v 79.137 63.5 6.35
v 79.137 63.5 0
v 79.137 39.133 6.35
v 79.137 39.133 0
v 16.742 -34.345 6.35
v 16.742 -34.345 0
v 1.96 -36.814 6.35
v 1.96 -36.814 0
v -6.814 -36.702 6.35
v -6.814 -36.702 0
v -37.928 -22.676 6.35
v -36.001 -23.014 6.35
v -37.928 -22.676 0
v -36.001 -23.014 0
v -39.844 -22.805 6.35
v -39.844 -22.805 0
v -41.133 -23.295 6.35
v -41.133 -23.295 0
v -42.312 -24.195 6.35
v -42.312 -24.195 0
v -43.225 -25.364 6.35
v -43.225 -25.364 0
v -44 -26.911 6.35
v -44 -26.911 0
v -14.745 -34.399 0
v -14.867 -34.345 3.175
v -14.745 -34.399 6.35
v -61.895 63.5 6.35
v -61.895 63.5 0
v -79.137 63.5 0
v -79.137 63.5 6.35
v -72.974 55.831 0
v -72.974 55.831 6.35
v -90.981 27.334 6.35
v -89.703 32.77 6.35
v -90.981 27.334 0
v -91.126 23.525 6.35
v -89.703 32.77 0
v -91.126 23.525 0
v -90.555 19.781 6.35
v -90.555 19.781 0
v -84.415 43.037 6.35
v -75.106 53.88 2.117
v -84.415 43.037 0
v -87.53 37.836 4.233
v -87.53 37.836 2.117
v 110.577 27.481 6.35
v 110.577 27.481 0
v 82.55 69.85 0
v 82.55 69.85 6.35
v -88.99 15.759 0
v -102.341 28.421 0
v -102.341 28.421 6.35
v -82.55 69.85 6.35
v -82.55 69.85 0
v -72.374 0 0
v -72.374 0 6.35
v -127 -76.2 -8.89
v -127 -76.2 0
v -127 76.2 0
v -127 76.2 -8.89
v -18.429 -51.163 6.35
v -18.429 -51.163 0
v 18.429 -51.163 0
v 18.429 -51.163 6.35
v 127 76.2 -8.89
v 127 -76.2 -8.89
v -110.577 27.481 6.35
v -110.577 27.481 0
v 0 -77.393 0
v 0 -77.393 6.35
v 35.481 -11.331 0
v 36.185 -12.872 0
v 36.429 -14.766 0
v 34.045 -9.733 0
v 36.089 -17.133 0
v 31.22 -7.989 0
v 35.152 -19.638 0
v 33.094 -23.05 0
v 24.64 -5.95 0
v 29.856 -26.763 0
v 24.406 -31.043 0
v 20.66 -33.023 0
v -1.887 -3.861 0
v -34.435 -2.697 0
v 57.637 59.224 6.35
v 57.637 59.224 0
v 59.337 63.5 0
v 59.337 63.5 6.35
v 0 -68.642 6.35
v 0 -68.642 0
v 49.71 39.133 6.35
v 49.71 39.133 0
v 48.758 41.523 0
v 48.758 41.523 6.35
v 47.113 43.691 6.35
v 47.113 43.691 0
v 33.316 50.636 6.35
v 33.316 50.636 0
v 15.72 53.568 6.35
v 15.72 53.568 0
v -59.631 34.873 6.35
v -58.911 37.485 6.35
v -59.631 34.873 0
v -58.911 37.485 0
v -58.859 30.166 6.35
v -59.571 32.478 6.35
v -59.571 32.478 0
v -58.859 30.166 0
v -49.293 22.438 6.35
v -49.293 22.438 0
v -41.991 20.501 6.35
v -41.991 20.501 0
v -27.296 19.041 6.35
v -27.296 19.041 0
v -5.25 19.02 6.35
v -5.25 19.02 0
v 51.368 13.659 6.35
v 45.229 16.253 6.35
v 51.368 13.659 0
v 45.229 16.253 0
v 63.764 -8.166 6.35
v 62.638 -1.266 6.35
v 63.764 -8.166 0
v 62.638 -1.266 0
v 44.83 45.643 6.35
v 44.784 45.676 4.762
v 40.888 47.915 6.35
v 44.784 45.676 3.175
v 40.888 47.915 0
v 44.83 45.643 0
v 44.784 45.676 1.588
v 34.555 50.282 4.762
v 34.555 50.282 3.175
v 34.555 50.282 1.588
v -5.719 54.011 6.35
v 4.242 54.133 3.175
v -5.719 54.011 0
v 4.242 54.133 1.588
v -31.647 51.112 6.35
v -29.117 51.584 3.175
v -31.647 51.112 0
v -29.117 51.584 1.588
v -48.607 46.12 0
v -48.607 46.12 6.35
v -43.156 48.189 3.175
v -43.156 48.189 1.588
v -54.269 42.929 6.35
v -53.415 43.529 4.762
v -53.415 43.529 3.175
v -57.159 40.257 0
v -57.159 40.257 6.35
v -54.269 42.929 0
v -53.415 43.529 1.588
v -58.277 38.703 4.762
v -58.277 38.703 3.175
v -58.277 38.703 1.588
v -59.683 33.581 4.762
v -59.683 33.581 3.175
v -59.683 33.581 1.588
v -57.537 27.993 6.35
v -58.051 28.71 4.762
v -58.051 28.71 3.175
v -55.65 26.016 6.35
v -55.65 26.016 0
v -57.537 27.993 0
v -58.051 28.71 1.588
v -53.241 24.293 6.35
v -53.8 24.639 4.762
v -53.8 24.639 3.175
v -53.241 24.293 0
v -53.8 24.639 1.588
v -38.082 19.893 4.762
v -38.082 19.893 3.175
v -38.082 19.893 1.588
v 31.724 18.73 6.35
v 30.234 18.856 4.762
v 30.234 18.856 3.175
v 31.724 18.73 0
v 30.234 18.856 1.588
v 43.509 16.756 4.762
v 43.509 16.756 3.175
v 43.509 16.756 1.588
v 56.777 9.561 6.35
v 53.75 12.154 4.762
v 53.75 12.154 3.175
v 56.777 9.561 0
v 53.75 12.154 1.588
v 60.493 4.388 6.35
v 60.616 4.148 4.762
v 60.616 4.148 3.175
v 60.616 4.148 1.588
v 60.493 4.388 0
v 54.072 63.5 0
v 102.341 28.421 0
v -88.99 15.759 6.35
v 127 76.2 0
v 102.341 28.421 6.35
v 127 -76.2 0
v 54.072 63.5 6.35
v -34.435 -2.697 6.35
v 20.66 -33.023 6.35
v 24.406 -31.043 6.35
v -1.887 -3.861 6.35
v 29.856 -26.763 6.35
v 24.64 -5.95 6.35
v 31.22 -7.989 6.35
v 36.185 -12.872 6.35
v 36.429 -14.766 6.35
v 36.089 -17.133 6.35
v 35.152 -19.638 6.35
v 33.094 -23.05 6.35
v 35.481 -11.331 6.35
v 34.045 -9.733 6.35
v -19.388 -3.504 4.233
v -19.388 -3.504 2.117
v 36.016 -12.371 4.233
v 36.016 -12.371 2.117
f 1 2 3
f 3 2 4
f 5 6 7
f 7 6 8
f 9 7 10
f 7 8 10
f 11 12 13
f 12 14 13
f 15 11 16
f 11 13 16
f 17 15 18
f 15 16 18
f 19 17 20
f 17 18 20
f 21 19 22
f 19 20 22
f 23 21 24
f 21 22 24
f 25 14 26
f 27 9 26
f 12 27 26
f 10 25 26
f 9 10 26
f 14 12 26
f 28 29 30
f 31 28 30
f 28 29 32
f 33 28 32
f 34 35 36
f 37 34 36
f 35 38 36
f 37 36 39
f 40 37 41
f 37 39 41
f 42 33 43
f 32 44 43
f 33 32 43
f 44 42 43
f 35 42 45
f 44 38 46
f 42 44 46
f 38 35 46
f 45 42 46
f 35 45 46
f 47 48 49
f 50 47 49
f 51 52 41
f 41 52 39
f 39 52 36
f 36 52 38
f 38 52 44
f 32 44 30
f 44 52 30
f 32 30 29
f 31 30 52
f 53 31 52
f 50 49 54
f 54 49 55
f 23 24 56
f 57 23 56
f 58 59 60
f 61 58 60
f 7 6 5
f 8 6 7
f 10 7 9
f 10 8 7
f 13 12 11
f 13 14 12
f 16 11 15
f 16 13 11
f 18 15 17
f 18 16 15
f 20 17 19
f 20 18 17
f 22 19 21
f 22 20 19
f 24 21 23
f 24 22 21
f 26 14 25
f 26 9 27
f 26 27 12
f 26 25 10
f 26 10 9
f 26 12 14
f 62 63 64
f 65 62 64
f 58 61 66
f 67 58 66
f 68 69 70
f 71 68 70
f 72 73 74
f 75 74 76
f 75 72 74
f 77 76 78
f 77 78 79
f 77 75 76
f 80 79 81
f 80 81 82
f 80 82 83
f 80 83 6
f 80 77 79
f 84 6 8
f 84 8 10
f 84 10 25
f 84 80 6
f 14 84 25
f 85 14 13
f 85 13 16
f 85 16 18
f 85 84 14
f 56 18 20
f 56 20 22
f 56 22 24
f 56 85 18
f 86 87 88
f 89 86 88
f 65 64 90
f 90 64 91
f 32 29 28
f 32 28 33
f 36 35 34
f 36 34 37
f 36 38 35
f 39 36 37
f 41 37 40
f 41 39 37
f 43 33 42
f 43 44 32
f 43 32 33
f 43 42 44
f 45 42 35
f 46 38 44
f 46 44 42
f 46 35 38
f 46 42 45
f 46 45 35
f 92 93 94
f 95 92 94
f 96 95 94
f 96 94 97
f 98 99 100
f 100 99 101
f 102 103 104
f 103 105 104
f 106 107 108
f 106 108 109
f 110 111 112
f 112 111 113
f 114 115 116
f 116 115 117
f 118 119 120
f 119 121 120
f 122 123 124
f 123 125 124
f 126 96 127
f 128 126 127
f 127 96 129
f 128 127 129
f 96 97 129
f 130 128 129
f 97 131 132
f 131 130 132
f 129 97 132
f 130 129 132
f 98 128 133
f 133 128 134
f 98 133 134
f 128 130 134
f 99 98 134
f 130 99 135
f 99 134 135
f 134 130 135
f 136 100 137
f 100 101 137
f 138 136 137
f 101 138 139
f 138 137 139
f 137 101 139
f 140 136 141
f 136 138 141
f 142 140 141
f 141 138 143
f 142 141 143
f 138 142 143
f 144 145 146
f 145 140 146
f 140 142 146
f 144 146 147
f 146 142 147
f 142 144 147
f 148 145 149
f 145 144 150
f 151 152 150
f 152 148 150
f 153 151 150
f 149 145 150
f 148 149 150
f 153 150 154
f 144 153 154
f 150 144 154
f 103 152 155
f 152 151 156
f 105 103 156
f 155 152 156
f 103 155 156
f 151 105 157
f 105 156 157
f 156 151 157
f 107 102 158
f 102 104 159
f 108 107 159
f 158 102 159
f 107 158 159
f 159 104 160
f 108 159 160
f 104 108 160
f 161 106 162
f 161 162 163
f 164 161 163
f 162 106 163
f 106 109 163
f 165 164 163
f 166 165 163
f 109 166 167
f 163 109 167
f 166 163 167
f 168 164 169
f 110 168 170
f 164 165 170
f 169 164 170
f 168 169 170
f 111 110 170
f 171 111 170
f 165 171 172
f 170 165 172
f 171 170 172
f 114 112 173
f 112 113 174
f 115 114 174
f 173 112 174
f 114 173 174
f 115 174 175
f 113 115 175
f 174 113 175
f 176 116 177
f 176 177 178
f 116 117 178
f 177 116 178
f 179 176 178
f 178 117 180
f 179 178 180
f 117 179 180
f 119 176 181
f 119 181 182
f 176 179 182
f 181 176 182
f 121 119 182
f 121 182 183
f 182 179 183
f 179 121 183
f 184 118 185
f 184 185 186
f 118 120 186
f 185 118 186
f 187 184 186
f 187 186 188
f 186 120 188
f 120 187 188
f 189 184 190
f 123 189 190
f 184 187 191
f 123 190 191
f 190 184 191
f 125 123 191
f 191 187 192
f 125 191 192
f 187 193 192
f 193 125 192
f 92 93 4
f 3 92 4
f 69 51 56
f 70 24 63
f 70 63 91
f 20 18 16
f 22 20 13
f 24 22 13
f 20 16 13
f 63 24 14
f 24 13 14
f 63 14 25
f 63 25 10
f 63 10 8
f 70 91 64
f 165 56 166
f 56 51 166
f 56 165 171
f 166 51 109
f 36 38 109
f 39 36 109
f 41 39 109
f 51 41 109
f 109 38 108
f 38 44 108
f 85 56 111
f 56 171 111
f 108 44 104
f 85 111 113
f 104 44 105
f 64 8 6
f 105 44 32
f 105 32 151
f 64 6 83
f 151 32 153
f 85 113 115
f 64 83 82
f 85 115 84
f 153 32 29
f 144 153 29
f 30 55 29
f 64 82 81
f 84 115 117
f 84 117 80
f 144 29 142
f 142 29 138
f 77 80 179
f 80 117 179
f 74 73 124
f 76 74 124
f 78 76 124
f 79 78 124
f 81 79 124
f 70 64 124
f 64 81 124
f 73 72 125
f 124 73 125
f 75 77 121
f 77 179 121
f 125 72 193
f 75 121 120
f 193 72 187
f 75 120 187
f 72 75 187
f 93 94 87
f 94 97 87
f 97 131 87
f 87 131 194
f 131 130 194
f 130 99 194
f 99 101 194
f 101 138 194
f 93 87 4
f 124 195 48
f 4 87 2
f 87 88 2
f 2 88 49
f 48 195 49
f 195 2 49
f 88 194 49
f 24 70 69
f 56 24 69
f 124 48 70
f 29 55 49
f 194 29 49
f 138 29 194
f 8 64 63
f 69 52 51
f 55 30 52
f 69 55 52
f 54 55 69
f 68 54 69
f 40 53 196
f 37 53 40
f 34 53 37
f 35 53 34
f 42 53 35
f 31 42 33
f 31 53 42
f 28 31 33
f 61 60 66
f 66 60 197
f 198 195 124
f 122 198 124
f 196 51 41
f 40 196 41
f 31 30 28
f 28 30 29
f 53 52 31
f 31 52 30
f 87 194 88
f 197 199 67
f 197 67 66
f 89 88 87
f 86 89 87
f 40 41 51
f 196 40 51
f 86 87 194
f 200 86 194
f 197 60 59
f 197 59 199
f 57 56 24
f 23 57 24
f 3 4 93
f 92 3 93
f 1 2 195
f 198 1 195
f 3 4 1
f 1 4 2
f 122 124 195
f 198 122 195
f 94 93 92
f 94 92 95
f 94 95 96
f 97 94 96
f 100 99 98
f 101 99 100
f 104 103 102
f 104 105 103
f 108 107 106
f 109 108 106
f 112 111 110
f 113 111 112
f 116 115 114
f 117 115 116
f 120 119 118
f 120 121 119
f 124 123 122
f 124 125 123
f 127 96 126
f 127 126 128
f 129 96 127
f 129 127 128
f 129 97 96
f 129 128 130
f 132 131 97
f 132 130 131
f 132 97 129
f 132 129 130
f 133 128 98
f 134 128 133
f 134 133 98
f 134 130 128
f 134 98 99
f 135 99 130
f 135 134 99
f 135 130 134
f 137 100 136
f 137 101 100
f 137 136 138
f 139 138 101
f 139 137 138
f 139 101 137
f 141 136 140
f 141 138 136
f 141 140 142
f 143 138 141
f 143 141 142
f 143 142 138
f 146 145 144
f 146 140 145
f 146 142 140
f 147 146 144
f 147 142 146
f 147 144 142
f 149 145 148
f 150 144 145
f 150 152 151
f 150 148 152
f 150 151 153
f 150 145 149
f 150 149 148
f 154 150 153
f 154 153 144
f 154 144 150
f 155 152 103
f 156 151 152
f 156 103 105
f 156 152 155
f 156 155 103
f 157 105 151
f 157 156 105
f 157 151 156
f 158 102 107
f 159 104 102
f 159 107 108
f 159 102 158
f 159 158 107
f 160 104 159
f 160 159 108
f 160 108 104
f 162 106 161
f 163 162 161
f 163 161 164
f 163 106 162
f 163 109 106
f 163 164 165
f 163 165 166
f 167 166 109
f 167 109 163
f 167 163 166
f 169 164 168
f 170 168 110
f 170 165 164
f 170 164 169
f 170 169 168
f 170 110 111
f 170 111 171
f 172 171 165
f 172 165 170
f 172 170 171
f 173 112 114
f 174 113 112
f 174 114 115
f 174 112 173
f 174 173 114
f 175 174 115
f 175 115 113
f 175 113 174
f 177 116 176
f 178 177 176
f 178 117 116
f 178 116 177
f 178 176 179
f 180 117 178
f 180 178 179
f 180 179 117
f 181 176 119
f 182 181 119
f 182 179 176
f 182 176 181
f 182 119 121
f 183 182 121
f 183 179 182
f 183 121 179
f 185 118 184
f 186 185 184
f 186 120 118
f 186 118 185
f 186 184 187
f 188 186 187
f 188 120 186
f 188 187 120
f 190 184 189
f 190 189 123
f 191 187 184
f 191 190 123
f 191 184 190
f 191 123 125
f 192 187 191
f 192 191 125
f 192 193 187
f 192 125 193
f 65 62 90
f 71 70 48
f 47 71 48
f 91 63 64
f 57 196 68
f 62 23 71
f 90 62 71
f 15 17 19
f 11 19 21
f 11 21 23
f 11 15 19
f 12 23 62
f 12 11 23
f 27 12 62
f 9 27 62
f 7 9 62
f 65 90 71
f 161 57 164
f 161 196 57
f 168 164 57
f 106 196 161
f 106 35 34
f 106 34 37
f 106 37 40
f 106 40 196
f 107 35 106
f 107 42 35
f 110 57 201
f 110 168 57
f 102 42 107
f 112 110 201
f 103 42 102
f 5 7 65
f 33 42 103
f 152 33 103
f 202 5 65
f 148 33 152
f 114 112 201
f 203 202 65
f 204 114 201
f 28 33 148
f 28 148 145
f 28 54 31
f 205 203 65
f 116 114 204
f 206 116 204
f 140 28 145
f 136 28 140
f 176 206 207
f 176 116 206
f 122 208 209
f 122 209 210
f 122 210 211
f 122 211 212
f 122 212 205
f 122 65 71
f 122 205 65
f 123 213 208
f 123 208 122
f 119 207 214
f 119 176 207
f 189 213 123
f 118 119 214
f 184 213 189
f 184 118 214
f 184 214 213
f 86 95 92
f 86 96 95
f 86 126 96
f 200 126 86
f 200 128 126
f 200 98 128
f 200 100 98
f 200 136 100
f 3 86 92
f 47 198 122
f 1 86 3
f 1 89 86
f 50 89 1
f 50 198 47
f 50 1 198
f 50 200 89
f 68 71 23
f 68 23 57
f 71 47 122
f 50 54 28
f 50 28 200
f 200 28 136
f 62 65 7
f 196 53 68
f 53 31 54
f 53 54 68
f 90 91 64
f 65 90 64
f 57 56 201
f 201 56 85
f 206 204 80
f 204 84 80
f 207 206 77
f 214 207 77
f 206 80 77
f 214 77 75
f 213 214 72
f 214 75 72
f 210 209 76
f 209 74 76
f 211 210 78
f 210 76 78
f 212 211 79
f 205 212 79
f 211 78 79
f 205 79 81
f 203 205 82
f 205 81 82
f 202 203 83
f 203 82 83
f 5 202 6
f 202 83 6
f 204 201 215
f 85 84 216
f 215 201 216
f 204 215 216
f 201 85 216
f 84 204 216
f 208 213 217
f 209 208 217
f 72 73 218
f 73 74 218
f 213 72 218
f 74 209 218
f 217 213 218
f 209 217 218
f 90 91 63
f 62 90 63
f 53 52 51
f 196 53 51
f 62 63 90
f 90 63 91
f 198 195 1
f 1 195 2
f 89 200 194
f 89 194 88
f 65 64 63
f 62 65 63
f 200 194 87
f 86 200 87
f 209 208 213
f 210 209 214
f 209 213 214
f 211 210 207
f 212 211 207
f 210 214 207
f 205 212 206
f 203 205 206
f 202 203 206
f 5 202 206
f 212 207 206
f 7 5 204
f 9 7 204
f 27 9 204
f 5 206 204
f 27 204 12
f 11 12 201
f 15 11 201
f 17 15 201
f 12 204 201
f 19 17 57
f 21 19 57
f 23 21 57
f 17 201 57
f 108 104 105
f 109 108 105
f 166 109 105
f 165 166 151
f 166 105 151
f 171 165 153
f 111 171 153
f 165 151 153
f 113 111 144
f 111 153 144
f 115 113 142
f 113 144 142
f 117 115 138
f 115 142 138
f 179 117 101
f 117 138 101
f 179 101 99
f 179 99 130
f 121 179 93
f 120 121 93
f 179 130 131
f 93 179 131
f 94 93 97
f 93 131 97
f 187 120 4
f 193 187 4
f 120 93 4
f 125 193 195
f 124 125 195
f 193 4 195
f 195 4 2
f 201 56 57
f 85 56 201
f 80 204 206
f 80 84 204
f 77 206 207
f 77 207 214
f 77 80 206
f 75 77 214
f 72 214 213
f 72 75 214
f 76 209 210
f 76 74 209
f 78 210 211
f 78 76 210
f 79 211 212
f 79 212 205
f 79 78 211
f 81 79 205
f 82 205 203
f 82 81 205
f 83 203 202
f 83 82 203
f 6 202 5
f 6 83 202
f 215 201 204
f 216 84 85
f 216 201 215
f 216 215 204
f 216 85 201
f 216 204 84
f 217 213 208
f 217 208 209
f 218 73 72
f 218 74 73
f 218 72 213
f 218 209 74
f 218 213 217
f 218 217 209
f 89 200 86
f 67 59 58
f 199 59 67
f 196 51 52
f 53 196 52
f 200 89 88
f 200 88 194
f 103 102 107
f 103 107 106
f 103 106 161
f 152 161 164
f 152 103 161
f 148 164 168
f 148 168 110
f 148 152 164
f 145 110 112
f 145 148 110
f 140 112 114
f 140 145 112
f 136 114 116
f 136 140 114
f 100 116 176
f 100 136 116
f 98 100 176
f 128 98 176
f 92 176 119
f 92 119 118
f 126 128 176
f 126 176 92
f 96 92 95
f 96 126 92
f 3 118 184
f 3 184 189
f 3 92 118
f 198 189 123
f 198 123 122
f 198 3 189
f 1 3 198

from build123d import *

# Parameters (mm, degrees)
F0_W     = 254
F0_H     = 152.4
F1_DEPTH = 8.89
F3_DEPTH = 6.35
F4_DEPTH = 6.35


with BuildPart() as f1:
    # F0 (on Top) → F1 (new body)
    with BuildSketch(Plane.XY):
        Rectangle(F0_W, F0_H)
    extrude(amount=-F1_DEPTH)


with BuildPart() as f3:
    # F2 (on face) → F3 (new body)
    with BuildSketch(Plane.XY):
        Polygon((-110.5765039644, 27.4807295846), (0, -77.3934653874), (110.5765039644, 27.4807295846), (82.55, 69.85), (0, 69.85), (-82.55, 69.85), align=None)
        Polygon((0, -68.6416965639), (-18.4294173274, -51.1626640686), (18.4294173274, -51.1626640686), align=None, mode=Mode.SUBTRACT)
        with BuildLine():
            Line((-44.0000207675, -26.9107085936), (-72.3739413137, 0))
            add(Edge.make_bspline(
                [(-72.3739413137, 0), (-56.4772636932, -0.1623677252), (-25.4767474165, -5.51335001), (53.4650384253, -1.948212177), (28.0139967905, -31.6587429979), (16.7418438941, -34.3451872468)],
                knots=[0, 0, 0, 0, 0.3610325629, 0.7321442872, 1, 1, 1, 1], degree=3))
            add(Edge.make_bspline(
                [(16.7418438941, -34.3451872468), (6.3339606859, -35.8872525394), (-12.5582004687, -43.0800227139), (-39.5378135145, -15.8403627574), (-44.0000207675, -26.9107085936)],
                knots=[0, 0, 0, 0, 0.5062543881, 1, 1, 1, 1], degree=3))
        make_face(mode=Mode.SUBTRACT)
        with BuildLine():
            Line((-102.34071652, 28.4214214864), (-79.1368730236, 63.5))
            Line((-79.1368730236, 63.5), (-61.8954822743, 63.5))
            add(Edge.make_bspline(
                [(-61.8954822743, 63.5), (-72.6268264588, 58.5622080867), (-95.101295313, 37.3717973696), (-90.5552589798, 19.7811521388)],
                knots=[0, 0, 0, 0, 50.9395259322, 50.9395259322, 50.9395259322, 50.9395259322], degree=3))
            Line((-90.5552589798, 19.7811521388), (-88.9901484483, 15.7593275628))
            Line((-88.9901484483, 15.7593275628), (-102.34071652, 28.4214214864))
        make_face(mode=Mode.SUBTRACT)
        with BuildLine():
            Line((102.34071652, 28.4214214864), (63.7637178758, -8.1662036618))
            add(Edge.make_bspline(
                [(49.7100912035, 39.1332991421), (44.9893101786, 59.2620450287), (-65.5701214452, 56.8028238808), (-58.1526178236, 11.8855718778), (32.4692170914, 25.4260499791), (62.1978511511, 11.5267576353), (63.7637178758, -8.1662036618)],
                knots=[0, 0, 0, 0, 0.3358949045, 0.4796056591, 0.7830399215, 1, 1, 1, 1], degree=3))
            Line((49.7100912035, 39.1332991421), (79.1368730236, 39.1332991421))
            Line((79.1368730236, 39.1332991421), (79.1368730236, 63.5))
            Line((79.1368730236, 63.5), (102.34071652, 28.4214214864))
        make_face(mode=Mode.SUBTRACT)
        Polygon((54.0717579424, 63.5), (59.3367516994, 63.5), (57.6373636723, 59.224486351), align=None, mode=Mode.SUBTRACT)
    extrude(amount=F3_DEPTH)


with BuildPart() as f4:
    # F2 (on face) → F4 (new body, through all)
    with BuildSketch(Plane.XY):
        Polygon((57.6373636723, 59.224486351), (59.3367516994, 63.5), (54.0717579424, 63.5), align=None)
    extrude(amount=F4_DEPTH)


with BuildPart() as f4b:
    # F2 (on face) → F4, piece 2 (new body, through all)
    with BuildSketch(Plane.XY):
        with BuildLine():
            add(Edge.make_bspline(
                [(49.7100912035, 39.1332991421), (44.9893101786, 59.2620450287), (-65.5701214452, 56.8028238808), (-58.1526178236, 11.8855718778), (32.4692170914, 25.4260499791), (62.1978511511, 11.5267576353), (63.7637178758, -8.1662036618)],
                knots=[0, 0, 0, 0, 0.3358949045, 0.4796056591, 0.7830399215, 1, 1, 1, 1], degree=3))
            Line((63.7637178758, -8.1662036618), (102.34071652, 28.4214214864))
            Line((102.34071652, 28.4214214864), (79.1368730236, 63.5))
            Line((79.1368730236, 63.5), (79.1368730236, 39.1332991421))
            Line((79.1368730236, 39.1332991421), (49.7100912035, 39.1332991421))
        make_face()
    extrude(amount=F4_DEPTH)


with BuildPart() as f4c:
    # F2 (on face) → F4, piece 3 (new body, through all)
    with BuildSketch(Plane.XY):
        Polygon((18.4294173274, -51.1626640686), (-18.4294173274, -51.1626640686), (0, -68.6416965639), align=None)
    extrude(amount=F4_DEPTH)


with BuildPart() as f4d:
    # F2 (on face) → F4, piece 4 (new body, through all)
    with BuildSketch(Plane.XY):
        with BuildLine():
            add(Edge.make_bspline(
                [(-72.3739413137, 0), (-56.4772636932, -0.1623677252), (-25.4767474165, -5.51335001), (53.4650384253, -1.948212177), (28.0139967905, -31.6587429979), (16.7418438941, -34.3451872468)],
                knots=[0, 0, 0, 0, 0.3610325629, 0.7321442872, 1, 1, 1, 1], degree=3))
            Line((-72.3739413137, 0), (-44.0000207675, -26.9107085936))
            add(Edge.make_bspline(
                [(16.7418438941, -34.3451872468), (6.3339606859, -35.8872525394), (-12.5582004687, -43.0800227139), (-39.5378135145, -15.8403627574), (-44.0000207675, -26.9107085936)],
                knots=[0, 0, 0, 0, 0.5062543881, 1, 1, 1, 1], degree=3))
        make_face()
    extrude(amount=F4_DEPTH)


with BuildPart() as f4e:
    # F2 (on face) → F4, piece 5 (new body, through all)
    with BuildSketch(Plane.XY):
        with BuildLine():
            Line((-61.8954822743, 63.5), (-79.1368730236, 63.5))
            Line((-79.1368730236, 63.5), (-102.34071652, 28.4214214864))
            Line((-102.34071652, 28.4214214864), (-88.9901484483, 15.7593275628))
            add(Edge.make_bspline(
                [(-90.5552589798, 19.7811521388), (-90.2023942784, 18.4157609891), (-89.6867334414, 17.0720581056), (-88.9901484483, 15.7593275628)],
                knots=[50.9395259322, 50.9395259322, 50.9395259322, 50.9395259322, 54.8934671872, 54.8934671872, 54.8934671872, 54.8934671872], degree=3))
            add(Edge.make_bspline(
                [(-61.8954822743, 63.5), (-72.6268264588, 58.5622080867), (-95.101295313, 37.3717973696), (-90.5552589798, 19.7811521388)],
                knots=[0, 0, 0, 0, 50.9395259322, 50.9395259322, 50.9395259322, 50.9395259322], degree=3))
        make_face()
        with BuildLine():
            Line((-88.9901484483, 15.7593275628), (-90.5552589798, 19.7811521388))
            add(Edge.make_bspline(
                [(-90.5552589798, 19.7811521388), (-90.2023942784, 18.4157609891), (-89.6867334414, 17.0720581056), (-88.9901484483, 15.7593275628)],
                knots=[50.9395259322, 50.9395259322, 50.9395259322, 50.9395259322, 54.8934671872, 54.8934671872, 54.8934671872, 54.8934671872], degree=3))
        make_face()
    extrude(amount=F4_DEPTH)


solid = Compound([f1.part, f3.part, f4.part, f4b.part, f4c.part, f4d.part, f4e.part])
